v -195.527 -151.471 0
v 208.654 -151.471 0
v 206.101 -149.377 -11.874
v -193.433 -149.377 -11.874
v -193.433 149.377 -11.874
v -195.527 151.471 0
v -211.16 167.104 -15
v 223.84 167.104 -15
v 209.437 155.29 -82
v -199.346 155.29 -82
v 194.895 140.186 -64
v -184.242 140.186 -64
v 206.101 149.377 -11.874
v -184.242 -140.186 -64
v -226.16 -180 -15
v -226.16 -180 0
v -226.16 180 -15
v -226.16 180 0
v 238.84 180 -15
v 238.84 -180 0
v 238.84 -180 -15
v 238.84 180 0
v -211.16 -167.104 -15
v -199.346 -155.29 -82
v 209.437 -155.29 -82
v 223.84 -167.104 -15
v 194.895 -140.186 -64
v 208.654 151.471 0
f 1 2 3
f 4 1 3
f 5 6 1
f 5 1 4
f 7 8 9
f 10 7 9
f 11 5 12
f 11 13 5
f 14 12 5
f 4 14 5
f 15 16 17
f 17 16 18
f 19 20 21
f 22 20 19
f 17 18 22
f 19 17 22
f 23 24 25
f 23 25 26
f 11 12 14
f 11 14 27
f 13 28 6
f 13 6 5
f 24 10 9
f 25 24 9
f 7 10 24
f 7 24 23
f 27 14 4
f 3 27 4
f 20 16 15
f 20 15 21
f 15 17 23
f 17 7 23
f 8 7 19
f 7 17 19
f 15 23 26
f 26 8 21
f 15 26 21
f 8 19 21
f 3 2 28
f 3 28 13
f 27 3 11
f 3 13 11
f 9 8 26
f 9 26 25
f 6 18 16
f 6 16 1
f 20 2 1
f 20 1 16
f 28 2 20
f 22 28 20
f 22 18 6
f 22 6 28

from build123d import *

# Parameters (mm, degrees)
F0_W          = 465
F0_H          = 360
F1_DEPTH      = 82
F3_DEPTH      = 238.8411541644
F3_DEPTH_BACK = 251
F5_DEPTH      = 190
F5_DEPTH_BACK = 341
F6_T          = 18
F6_T3_DEPTH   = 370.2074342574
F6_T5_DEPTH   = 471


# Not quite as in the source:
# - a shell that OpenCascade refuses in one call is made with other operations: the cavity is built on its own and cut out


with BuildPart() as f1:
    # F0 (on Top) → F1 (new body)
    with BuildSketch(Plane.XY):
        with Locations((6.3401541644, 0)):
            Rectangle(F0_W, F0_H)
    extrude(amount=-F1_DEPTH)

    # F2 (on Right) → F3 (cut, two sides)
    with BuildSketch(Plane.YZ) as f3_sk:
        Polygon((-210, -15), (-210, -112), (-150, -112), (-167.1037171287, -15), align=None)
        Polygon((210, -15), (167.1037171287, -15), (150, -112), (210, -112), align=None)
    extrude(amount=F3_DEPTH, mode=Mode.SUBTRACT)
    extrude(f3_sk.sketch, amount=-F3_DEPTH_BACK, mode=Mode.SUBTRACT)

    # F4 (on Front) → F5 (cut, two sides)
    with BuildSketch(Plane.XZ) as f5_sk:
        Polygon((-241.1598458356, -15), (-241.1598458356, -185.1384545885), (-181.1598458356, -185.1384545885), (-211.1598458356, -15), align=None)
        Polygon((253.8401541644, -15), (223.8401541644, -15), (193.8816988413, -154.3605614963), (253.8401541644, -156.5929672103), align=None)
    extrude(amount=F5_DEPTH, mode=Mode.SUBTRACT)
    extrude(f5_sk.sketch, amount=-F5_DEPTH_BACK, mode=Mode.SUBTRACT)

    # F6: shell of thickness 18, made by hand


with BuildPart() as f6_core1:
    # F6_t2: copy of F1
    add(f1.part)

    # the walls: a layer under each face that stays
    f6_faces = [f6_core1.faces().sort_by_distance(p)[0] for p in [
        (-226.1598458356, 0, -7.5),
        (6.3401541644, -180, -7.5),
        (238.8401541644, 0, -7.5),
        (223.3401541644, 168, -15),
        (6.3401541644, 161.196763275, -48.5),
        (5.0455852734, 0, -82),
        (216.6386314197, 0, -48.5),
        (6.3401541644, -161.196763275, -48.5),
        (-205.2528919819, 0, -48.5),
        (6.3401541644, 180, -7.5),
    ]]
    thicken(f6_faces, amount=-F6_T, mode=Mode.SUBTRACT)

    # F6_s4 → F6_t3 (cut)
    with BuildSketch(Plane.XZ.offset(-185.1037171287)):
        Polygon((-211.3371112312, -15.211256672), (-211.1598458356, 3), (-196.0560524744, 3), (-193.4333062814, -11.874332802), align=None)
        Polygon((224.0161338598, -15.2178305009), (223.8401541644, 3), (209.2984141185, 3), (206.2421846213, -11.2169499127), align=None)
    extrude(amount=F6_T3_DEPTH, mode=Mode.SUBTRACT)

    # F6_s6 → F6_t5 (cut)
    with BuildSketch(Plane.YZ.offset(-229.1598458356)):
        Polygon((-167.2809825243, -15.211256672), (-167.1037171287, 3), (-151.9999237675, 3), (-149.3771775745, -11.874332802), align=None)
        Polygon((167.2809825243, -15.211256672), (167.1037171287, 3), (151.9999237675, 3), (149.3771775745, -11.874332802), align=None)
    extrude(amount=F6_T5_DEPTH, mode=Mode.SUBTRACT)


with BuildPart() as f1_1:
    add(f1.part)

    # what is left inside the walls is the cavity
    f6_cavity = [f6_core1.part.solids().sort_by_distance(p)[0] for p in [
        (6.563215, -50.490314, -0.18),
    ]]
    add(f6_cavity, mode=Mode.SUBTRACT)


solid = f1_1.part
